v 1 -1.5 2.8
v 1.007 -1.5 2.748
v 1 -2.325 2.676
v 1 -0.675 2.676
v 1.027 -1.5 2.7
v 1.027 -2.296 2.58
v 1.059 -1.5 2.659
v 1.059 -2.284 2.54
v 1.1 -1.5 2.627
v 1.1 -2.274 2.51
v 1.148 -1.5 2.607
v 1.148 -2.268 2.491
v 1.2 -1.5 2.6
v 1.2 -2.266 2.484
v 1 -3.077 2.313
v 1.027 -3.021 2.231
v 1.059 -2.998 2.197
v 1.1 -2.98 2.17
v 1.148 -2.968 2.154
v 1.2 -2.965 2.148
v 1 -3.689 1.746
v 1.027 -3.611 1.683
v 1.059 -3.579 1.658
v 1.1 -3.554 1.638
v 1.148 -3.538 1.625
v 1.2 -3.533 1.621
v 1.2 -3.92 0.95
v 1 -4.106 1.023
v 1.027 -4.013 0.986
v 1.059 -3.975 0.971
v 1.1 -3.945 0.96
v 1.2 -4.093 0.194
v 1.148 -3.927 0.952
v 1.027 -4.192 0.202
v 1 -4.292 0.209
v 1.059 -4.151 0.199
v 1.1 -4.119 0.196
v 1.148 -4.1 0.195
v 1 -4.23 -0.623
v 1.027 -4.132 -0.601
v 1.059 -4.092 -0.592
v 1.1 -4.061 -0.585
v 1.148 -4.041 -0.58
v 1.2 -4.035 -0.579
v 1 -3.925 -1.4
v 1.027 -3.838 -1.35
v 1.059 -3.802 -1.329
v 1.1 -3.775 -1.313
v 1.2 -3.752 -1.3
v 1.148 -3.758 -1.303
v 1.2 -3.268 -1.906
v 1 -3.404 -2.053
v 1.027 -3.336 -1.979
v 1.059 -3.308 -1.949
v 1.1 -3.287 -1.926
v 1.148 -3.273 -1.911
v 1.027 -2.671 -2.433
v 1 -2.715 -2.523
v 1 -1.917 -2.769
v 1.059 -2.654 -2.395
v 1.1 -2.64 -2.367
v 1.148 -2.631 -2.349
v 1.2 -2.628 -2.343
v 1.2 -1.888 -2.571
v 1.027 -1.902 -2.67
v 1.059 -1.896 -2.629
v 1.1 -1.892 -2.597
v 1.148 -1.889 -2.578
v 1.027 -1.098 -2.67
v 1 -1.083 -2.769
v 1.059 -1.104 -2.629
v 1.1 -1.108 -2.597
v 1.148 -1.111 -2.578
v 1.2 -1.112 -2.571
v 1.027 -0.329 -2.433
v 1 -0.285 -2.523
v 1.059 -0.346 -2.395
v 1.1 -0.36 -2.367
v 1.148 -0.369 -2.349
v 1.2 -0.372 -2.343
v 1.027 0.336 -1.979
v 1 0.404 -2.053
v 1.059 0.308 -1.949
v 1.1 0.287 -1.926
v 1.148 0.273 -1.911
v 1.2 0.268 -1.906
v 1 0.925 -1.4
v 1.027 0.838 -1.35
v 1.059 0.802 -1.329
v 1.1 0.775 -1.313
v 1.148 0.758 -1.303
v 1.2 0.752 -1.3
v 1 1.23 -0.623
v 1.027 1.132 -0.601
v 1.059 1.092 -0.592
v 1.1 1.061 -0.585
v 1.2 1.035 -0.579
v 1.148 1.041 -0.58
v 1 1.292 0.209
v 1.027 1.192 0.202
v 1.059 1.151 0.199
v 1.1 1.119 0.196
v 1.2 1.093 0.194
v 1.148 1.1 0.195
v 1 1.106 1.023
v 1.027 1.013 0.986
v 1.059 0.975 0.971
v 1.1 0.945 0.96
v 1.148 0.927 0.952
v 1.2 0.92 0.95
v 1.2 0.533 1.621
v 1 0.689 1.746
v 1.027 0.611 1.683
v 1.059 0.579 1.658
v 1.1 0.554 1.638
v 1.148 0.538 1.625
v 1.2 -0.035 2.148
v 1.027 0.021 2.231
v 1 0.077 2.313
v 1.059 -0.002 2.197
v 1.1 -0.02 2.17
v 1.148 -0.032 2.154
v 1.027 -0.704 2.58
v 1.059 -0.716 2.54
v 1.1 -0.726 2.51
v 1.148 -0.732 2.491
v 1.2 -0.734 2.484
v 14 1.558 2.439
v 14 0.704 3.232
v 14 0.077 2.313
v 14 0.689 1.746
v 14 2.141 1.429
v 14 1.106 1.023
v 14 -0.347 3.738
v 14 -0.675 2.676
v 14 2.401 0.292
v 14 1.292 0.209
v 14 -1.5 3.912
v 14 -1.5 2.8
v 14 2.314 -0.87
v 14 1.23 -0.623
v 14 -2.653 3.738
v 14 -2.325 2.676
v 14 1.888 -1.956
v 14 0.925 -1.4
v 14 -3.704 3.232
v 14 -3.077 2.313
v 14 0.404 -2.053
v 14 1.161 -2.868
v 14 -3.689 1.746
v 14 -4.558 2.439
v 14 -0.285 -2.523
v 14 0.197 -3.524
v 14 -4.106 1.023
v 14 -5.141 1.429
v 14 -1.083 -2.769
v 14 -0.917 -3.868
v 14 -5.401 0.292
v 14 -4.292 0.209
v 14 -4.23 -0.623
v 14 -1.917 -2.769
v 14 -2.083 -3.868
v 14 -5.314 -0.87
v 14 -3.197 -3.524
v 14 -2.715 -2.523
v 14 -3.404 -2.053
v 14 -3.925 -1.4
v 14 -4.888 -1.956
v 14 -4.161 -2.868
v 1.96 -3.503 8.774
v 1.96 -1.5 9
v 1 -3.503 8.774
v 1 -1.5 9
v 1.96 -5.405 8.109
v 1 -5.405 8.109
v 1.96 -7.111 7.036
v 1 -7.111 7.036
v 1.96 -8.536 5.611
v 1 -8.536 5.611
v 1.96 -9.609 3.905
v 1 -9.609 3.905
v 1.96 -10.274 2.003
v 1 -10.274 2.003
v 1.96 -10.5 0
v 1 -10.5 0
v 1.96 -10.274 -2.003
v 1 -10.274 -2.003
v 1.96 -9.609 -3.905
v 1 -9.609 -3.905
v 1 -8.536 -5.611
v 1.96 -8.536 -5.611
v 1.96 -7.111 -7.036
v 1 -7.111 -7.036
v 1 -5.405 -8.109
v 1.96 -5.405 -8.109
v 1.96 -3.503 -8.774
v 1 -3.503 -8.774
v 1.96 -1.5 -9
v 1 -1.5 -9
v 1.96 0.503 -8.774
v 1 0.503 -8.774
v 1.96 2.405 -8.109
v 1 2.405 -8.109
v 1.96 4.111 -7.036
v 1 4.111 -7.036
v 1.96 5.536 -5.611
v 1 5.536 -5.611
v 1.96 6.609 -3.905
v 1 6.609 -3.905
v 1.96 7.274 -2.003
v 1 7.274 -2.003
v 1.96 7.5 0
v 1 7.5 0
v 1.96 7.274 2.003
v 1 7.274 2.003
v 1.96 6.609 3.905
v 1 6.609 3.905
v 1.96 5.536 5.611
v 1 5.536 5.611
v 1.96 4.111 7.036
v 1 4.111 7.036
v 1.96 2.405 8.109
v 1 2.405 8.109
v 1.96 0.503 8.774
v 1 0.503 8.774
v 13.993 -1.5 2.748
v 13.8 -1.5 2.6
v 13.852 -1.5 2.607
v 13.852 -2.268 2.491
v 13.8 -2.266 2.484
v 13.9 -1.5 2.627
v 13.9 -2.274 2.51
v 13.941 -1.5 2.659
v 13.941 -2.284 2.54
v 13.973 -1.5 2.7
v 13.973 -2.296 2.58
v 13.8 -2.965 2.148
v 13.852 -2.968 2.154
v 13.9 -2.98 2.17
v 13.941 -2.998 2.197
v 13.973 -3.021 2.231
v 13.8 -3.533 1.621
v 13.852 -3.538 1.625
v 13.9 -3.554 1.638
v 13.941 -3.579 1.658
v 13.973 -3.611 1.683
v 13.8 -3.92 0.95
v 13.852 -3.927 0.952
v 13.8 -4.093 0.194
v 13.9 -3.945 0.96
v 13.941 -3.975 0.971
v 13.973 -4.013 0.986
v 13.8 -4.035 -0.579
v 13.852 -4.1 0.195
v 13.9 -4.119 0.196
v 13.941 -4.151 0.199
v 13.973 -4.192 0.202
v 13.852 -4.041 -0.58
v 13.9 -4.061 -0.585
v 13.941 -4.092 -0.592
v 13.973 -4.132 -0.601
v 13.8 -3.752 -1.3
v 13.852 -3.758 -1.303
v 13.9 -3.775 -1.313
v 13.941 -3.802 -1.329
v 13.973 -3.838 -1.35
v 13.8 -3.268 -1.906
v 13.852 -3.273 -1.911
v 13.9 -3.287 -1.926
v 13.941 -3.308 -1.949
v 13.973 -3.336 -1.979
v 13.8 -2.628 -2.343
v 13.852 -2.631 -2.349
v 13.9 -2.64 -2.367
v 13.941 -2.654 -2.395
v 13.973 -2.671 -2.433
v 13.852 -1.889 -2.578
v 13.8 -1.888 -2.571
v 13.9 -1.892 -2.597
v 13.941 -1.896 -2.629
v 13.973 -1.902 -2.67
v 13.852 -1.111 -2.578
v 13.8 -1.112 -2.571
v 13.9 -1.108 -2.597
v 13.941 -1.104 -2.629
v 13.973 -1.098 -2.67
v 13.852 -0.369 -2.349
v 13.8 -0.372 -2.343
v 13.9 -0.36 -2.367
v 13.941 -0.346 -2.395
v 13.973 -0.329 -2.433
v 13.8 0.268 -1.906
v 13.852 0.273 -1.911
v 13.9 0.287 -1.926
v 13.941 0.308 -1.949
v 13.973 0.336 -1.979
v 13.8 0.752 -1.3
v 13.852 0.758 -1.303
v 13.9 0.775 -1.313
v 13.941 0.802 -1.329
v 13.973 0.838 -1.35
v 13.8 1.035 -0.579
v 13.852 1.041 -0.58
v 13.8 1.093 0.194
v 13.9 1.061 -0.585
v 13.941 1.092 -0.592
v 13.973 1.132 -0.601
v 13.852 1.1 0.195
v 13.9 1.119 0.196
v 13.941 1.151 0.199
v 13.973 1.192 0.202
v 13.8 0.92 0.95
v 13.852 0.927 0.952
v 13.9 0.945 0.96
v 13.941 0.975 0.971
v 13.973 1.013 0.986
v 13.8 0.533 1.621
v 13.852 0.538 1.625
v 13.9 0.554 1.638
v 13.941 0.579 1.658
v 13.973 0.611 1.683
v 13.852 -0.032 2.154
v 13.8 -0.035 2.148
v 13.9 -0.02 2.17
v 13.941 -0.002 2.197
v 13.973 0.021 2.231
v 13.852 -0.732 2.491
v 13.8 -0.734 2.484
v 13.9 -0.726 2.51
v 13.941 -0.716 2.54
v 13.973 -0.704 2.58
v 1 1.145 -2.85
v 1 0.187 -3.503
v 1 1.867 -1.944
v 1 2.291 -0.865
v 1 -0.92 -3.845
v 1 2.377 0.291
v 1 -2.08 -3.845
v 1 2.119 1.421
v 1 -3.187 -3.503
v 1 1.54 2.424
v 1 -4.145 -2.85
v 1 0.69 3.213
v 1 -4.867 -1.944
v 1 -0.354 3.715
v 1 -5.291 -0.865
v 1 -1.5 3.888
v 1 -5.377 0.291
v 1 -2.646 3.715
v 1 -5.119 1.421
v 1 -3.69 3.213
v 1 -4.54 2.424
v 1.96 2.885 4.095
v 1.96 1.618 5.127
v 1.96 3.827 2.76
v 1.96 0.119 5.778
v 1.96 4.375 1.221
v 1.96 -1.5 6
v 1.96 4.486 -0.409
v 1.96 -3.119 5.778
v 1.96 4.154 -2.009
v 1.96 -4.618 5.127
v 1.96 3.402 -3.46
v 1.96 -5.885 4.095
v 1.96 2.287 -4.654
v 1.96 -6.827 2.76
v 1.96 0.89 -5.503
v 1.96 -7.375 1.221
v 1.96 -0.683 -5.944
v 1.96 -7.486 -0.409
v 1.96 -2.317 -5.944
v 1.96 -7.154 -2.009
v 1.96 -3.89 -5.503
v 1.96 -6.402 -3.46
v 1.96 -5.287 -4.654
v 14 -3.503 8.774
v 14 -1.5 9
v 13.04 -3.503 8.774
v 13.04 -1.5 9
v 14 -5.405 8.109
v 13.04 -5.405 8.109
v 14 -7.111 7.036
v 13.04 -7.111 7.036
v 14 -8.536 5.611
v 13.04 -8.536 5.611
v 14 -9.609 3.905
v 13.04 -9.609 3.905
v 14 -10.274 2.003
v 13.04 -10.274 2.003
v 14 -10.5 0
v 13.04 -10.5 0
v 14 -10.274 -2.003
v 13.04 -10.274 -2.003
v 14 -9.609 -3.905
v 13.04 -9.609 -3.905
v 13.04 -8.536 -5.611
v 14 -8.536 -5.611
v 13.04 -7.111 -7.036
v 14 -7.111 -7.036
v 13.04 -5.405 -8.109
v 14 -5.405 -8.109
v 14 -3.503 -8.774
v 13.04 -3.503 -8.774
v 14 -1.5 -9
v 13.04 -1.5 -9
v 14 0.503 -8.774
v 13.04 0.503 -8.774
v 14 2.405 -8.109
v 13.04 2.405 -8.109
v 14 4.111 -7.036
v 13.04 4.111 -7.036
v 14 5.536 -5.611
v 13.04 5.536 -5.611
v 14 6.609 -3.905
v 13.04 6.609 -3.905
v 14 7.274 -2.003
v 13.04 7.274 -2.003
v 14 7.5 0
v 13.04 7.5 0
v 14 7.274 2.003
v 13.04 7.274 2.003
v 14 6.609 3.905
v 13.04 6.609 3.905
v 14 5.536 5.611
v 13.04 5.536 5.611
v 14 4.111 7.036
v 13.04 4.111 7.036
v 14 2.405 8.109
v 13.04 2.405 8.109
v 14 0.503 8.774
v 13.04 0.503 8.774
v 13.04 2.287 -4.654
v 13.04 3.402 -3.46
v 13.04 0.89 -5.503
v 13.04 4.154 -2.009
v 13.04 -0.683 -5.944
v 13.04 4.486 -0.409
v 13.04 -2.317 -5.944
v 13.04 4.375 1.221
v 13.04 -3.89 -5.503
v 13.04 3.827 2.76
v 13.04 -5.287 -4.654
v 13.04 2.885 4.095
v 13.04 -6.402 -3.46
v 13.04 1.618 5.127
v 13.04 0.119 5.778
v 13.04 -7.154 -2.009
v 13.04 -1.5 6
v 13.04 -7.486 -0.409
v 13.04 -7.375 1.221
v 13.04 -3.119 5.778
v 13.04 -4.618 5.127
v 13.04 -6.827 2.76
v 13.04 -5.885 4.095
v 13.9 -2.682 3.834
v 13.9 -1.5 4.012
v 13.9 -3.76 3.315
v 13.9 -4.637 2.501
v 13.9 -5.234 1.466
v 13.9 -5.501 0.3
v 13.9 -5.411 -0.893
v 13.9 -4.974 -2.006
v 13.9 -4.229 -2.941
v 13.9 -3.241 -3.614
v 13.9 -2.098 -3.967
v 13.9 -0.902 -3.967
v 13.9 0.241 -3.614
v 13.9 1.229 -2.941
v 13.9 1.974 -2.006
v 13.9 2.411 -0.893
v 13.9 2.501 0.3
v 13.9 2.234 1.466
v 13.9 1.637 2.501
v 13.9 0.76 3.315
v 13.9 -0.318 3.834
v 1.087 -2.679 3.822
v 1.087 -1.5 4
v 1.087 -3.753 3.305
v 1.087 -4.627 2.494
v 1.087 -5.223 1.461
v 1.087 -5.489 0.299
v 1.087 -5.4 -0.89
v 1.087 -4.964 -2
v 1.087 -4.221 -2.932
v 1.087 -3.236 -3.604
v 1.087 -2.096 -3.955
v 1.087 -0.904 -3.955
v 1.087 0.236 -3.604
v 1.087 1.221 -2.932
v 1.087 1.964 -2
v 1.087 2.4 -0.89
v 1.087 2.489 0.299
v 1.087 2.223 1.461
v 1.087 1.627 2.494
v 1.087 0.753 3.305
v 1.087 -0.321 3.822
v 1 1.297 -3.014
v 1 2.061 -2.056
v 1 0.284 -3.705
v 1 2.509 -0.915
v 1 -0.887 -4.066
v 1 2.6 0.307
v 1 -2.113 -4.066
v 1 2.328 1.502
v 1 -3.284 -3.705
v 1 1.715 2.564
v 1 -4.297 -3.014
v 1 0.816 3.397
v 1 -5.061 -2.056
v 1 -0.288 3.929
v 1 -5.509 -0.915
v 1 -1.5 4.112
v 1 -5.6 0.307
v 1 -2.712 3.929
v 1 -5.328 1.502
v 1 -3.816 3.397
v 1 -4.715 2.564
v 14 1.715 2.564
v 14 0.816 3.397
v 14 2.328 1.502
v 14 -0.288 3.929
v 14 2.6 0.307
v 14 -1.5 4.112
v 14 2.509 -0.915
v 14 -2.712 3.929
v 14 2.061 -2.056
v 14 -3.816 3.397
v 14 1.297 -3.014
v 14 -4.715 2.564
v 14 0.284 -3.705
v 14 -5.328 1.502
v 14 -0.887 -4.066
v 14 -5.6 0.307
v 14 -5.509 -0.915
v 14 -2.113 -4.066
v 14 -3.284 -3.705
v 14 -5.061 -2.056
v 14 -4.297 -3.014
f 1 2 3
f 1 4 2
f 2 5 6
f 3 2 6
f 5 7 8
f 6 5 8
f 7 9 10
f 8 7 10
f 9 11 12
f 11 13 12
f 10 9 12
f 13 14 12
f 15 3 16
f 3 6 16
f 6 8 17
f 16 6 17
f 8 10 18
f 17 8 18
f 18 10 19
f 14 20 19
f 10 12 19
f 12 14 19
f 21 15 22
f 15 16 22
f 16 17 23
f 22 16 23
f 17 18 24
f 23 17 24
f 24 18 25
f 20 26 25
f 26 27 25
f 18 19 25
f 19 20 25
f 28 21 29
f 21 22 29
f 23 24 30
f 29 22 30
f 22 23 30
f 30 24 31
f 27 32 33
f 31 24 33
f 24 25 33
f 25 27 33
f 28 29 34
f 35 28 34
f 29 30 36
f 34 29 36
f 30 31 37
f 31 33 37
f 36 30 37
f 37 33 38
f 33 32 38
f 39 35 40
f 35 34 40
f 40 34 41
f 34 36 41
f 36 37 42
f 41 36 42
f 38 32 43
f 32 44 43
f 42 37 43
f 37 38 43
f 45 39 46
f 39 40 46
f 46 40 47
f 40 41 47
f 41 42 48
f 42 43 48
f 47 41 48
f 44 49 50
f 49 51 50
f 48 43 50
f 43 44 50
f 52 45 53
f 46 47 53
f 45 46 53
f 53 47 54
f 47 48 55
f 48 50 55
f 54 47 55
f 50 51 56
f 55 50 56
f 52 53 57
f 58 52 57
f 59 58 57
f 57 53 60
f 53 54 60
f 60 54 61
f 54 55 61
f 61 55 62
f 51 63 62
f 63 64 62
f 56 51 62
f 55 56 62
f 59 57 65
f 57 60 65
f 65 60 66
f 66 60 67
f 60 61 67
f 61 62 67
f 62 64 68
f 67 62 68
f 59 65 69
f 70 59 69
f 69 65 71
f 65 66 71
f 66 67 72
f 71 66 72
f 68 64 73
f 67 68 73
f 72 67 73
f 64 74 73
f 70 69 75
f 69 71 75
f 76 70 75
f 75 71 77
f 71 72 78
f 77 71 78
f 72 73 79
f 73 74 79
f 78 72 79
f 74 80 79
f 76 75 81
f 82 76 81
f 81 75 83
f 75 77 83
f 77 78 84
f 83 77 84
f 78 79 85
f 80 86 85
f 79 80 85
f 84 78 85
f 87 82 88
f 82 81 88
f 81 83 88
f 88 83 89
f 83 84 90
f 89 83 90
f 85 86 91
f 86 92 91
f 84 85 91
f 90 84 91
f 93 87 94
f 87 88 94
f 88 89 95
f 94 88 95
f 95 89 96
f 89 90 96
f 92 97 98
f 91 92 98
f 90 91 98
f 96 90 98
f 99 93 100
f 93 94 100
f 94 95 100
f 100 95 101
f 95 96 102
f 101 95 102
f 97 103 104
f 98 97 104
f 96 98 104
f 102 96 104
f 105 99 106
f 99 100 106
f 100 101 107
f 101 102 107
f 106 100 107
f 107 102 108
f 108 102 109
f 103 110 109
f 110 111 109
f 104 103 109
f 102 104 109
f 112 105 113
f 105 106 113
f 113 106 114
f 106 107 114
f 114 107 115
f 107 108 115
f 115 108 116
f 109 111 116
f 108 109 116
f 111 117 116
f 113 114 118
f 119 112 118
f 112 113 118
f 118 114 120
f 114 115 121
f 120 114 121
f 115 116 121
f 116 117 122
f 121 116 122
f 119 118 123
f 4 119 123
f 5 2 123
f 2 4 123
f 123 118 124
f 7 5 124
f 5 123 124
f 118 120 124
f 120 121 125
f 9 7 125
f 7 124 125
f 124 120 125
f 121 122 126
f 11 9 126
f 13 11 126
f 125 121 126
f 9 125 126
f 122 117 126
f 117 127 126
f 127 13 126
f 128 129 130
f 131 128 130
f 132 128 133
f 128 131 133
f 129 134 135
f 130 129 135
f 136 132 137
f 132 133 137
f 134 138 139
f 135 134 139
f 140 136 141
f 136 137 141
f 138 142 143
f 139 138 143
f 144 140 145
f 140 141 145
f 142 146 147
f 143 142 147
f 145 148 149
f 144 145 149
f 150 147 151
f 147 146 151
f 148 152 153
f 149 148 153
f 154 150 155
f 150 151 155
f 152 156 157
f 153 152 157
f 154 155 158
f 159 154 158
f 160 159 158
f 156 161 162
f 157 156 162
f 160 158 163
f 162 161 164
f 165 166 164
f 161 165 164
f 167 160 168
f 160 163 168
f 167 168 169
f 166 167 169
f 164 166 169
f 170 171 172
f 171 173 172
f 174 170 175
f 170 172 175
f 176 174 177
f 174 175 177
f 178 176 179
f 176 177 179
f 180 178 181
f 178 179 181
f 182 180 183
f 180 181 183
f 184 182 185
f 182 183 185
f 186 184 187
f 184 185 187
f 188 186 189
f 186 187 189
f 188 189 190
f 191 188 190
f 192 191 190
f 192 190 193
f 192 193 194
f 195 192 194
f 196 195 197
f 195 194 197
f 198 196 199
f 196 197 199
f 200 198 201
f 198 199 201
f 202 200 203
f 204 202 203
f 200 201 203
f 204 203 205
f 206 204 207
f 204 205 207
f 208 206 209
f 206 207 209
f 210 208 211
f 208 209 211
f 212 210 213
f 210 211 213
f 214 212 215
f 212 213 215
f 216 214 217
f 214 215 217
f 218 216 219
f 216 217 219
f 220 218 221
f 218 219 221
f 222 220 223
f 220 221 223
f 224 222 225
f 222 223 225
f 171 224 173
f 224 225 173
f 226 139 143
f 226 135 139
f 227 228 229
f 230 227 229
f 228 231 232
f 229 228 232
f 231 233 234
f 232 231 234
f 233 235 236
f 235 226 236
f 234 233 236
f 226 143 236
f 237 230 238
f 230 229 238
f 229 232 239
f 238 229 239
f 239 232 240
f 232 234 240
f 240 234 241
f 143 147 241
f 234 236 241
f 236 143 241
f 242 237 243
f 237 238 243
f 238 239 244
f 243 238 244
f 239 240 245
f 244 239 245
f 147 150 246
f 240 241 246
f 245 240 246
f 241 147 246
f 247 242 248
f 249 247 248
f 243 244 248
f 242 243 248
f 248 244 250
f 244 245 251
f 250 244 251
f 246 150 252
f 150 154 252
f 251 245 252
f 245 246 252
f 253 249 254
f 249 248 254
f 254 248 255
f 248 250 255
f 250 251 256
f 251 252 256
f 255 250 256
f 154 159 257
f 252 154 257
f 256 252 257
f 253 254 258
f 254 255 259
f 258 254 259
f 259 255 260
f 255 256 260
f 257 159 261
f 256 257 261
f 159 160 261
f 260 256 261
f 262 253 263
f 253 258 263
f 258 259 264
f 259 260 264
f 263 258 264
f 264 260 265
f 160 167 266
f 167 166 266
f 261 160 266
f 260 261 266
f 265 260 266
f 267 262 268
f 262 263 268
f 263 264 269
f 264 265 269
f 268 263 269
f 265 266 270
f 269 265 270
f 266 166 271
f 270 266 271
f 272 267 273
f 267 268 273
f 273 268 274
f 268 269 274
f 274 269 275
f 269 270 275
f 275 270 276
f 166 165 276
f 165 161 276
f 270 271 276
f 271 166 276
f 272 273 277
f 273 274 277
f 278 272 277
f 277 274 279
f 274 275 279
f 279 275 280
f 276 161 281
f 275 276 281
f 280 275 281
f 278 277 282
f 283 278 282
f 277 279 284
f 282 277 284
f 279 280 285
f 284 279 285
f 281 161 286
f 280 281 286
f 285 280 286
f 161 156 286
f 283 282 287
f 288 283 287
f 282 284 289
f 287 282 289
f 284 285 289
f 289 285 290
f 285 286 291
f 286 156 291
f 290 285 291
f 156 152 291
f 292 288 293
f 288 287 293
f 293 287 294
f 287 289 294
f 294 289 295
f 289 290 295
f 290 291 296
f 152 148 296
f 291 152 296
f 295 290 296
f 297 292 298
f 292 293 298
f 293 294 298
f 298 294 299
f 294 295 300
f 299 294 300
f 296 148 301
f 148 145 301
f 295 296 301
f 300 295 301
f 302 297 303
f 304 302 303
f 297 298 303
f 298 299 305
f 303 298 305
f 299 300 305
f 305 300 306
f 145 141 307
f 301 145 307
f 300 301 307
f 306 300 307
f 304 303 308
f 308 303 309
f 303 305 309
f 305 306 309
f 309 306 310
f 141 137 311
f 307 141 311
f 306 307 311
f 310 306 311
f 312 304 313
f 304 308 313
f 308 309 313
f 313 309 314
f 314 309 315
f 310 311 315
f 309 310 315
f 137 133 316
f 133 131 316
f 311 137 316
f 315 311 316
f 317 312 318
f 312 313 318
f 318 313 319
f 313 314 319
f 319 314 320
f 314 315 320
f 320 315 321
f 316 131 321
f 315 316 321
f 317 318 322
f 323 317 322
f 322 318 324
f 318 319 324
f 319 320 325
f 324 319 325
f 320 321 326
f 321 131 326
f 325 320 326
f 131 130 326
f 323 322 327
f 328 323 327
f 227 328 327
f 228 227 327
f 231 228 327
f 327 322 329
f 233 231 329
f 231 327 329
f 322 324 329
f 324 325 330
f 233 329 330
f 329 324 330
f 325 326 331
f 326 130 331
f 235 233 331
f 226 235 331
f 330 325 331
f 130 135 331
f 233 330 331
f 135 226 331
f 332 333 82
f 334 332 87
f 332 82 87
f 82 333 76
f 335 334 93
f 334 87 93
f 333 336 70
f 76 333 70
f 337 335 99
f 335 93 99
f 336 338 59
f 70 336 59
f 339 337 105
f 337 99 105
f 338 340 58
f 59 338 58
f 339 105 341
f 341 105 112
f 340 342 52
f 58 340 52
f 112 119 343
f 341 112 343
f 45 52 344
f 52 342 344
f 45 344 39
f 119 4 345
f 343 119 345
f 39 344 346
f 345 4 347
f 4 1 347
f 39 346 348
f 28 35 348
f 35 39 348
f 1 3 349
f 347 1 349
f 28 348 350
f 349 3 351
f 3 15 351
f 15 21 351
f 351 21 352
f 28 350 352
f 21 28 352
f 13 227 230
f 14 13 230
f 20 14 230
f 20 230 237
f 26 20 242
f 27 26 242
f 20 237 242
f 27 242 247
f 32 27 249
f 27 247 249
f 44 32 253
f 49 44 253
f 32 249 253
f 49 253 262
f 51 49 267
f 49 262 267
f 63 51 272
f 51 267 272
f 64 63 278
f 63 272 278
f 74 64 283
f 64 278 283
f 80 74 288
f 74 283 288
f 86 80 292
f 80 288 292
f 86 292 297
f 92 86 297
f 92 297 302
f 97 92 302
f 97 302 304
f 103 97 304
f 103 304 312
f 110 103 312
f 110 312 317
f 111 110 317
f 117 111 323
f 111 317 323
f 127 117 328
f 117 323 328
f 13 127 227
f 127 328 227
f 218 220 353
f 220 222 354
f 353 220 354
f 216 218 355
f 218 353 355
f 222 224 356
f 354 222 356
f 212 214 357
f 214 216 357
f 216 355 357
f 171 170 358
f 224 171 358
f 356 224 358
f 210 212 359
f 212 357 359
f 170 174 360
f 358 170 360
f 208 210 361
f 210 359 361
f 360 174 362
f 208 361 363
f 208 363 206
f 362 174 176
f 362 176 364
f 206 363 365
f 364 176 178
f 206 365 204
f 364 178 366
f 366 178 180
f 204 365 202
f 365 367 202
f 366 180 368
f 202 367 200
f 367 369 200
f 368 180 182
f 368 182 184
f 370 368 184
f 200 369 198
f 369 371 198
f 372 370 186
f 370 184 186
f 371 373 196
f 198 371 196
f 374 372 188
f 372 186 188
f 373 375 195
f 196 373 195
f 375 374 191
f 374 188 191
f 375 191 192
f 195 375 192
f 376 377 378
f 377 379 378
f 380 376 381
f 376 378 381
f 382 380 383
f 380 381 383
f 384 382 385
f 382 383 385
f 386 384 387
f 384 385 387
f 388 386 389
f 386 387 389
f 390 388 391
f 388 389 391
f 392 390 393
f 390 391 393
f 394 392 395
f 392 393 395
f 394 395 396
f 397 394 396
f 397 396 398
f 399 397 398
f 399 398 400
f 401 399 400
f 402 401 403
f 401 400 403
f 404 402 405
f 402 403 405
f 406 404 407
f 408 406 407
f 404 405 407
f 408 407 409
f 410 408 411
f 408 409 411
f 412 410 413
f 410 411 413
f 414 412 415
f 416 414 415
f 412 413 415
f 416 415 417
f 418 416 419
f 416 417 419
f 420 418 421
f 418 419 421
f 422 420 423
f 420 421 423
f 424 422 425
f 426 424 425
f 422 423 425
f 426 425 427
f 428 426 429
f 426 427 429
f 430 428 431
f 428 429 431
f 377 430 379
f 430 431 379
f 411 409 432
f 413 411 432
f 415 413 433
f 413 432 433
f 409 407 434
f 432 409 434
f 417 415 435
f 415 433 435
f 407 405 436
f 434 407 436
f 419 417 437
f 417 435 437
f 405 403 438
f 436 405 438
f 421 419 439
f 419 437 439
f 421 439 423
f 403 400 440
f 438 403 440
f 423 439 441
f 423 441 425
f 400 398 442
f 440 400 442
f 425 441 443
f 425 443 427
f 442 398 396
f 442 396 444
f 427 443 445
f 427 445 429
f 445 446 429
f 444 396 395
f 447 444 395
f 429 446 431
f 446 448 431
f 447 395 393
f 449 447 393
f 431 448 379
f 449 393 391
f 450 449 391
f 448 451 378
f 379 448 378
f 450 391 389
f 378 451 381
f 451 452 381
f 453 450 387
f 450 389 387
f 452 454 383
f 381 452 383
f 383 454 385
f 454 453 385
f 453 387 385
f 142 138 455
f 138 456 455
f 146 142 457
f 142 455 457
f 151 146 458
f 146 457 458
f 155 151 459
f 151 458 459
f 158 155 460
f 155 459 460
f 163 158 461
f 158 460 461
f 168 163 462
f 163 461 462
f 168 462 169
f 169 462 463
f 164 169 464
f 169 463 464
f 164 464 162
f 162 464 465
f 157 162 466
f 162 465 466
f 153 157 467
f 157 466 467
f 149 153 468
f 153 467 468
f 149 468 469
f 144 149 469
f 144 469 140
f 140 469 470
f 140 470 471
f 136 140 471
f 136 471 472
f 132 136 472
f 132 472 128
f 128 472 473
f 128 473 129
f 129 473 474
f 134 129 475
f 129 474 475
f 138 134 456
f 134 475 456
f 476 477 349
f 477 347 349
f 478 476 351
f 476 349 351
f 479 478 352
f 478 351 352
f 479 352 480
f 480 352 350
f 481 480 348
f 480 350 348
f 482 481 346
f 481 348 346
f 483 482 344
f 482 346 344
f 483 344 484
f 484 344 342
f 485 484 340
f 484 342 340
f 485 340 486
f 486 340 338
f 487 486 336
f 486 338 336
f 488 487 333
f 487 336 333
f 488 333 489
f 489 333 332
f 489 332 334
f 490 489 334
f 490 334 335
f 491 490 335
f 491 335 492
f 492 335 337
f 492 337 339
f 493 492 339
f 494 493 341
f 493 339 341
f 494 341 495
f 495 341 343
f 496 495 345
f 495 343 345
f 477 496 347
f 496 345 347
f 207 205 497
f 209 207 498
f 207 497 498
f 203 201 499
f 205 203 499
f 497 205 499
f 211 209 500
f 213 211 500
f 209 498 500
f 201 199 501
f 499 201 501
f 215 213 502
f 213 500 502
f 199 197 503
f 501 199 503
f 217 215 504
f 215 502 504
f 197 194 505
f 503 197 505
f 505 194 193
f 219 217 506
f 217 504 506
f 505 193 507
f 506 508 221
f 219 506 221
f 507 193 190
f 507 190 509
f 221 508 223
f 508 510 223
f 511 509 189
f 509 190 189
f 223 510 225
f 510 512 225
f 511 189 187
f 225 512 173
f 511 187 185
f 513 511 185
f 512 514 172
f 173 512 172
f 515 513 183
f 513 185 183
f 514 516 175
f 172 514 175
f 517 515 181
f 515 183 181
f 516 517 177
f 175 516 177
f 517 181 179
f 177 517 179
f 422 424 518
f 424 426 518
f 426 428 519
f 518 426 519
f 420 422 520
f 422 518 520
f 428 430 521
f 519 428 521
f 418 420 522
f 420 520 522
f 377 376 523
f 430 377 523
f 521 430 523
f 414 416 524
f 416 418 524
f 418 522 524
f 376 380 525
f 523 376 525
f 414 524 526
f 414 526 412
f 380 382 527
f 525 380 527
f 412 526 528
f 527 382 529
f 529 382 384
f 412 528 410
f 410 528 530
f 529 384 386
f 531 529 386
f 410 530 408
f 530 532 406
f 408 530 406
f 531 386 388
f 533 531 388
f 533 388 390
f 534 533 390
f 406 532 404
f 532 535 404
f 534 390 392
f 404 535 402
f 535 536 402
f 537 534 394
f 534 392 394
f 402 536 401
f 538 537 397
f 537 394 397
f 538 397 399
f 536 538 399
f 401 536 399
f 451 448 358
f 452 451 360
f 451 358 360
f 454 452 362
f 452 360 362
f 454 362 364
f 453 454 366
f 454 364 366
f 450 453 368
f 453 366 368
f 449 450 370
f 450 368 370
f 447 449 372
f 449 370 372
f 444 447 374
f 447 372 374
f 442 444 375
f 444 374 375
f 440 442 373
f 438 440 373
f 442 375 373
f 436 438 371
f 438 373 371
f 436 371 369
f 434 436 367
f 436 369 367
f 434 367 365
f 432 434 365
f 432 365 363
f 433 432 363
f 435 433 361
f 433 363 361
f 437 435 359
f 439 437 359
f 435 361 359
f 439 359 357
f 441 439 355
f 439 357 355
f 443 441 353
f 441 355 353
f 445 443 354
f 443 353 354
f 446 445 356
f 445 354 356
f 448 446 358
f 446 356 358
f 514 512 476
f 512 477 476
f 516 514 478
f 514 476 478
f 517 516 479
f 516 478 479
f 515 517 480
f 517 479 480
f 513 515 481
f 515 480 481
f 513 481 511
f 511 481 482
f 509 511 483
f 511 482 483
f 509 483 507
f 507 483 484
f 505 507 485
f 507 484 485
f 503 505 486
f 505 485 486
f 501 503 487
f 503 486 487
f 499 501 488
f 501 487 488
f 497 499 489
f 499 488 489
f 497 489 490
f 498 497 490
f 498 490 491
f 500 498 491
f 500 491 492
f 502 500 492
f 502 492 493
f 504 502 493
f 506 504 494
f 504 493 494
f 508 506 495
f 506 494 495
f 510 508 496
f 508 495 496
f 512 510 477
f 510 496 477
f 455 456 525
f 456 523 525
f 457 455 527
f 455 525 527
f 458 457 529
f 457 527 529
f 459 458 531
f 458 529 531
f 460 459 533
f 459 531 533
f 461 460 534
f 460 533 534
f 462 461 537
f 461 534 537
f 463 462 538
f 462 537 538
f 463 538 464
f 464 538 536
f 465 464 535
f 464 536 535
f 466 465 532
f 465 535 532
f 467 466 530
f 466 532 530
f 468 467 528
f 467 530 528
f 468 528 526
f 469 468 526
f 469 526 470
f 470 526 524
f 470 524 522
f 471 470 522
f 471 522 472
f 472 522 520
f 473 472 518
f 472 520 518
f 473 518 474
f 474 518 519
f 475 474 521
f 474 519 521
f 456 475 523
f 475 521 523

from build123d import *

# Parameters (mm, degrees)
FILLET1_R = 0.2


with BuildPart() as part:
    # Sketch 1 → Body (revolve)
    with BuildSketch(Plane.XY):
        Polygon((1.96, 7.5), (1, 7.5), (1, 2.611783382), (1.086628376, 2.5), (1, 2.388216618), (1, 1.1), (14, 1.1), (14, 2.411783382), (13.9, 2.511783382), (14, 2.611783382), (14, 7.5), (13.04, 7.5), (13.04, 4.5), (1.96, 4.5), align=None)
    revolve(axis=Axis((1, -1.5, 0), (1, 0, 0)))

    # Fillet1
    fillet1_edges = [part.edges().sort_by_distance(p)[0] for p in [
        (14, -4.1, 0),
        (1, -4.1, 0),
    ]]
    fillet(fillet1_edges, radius=FILLET1_R)


solid = part.part
